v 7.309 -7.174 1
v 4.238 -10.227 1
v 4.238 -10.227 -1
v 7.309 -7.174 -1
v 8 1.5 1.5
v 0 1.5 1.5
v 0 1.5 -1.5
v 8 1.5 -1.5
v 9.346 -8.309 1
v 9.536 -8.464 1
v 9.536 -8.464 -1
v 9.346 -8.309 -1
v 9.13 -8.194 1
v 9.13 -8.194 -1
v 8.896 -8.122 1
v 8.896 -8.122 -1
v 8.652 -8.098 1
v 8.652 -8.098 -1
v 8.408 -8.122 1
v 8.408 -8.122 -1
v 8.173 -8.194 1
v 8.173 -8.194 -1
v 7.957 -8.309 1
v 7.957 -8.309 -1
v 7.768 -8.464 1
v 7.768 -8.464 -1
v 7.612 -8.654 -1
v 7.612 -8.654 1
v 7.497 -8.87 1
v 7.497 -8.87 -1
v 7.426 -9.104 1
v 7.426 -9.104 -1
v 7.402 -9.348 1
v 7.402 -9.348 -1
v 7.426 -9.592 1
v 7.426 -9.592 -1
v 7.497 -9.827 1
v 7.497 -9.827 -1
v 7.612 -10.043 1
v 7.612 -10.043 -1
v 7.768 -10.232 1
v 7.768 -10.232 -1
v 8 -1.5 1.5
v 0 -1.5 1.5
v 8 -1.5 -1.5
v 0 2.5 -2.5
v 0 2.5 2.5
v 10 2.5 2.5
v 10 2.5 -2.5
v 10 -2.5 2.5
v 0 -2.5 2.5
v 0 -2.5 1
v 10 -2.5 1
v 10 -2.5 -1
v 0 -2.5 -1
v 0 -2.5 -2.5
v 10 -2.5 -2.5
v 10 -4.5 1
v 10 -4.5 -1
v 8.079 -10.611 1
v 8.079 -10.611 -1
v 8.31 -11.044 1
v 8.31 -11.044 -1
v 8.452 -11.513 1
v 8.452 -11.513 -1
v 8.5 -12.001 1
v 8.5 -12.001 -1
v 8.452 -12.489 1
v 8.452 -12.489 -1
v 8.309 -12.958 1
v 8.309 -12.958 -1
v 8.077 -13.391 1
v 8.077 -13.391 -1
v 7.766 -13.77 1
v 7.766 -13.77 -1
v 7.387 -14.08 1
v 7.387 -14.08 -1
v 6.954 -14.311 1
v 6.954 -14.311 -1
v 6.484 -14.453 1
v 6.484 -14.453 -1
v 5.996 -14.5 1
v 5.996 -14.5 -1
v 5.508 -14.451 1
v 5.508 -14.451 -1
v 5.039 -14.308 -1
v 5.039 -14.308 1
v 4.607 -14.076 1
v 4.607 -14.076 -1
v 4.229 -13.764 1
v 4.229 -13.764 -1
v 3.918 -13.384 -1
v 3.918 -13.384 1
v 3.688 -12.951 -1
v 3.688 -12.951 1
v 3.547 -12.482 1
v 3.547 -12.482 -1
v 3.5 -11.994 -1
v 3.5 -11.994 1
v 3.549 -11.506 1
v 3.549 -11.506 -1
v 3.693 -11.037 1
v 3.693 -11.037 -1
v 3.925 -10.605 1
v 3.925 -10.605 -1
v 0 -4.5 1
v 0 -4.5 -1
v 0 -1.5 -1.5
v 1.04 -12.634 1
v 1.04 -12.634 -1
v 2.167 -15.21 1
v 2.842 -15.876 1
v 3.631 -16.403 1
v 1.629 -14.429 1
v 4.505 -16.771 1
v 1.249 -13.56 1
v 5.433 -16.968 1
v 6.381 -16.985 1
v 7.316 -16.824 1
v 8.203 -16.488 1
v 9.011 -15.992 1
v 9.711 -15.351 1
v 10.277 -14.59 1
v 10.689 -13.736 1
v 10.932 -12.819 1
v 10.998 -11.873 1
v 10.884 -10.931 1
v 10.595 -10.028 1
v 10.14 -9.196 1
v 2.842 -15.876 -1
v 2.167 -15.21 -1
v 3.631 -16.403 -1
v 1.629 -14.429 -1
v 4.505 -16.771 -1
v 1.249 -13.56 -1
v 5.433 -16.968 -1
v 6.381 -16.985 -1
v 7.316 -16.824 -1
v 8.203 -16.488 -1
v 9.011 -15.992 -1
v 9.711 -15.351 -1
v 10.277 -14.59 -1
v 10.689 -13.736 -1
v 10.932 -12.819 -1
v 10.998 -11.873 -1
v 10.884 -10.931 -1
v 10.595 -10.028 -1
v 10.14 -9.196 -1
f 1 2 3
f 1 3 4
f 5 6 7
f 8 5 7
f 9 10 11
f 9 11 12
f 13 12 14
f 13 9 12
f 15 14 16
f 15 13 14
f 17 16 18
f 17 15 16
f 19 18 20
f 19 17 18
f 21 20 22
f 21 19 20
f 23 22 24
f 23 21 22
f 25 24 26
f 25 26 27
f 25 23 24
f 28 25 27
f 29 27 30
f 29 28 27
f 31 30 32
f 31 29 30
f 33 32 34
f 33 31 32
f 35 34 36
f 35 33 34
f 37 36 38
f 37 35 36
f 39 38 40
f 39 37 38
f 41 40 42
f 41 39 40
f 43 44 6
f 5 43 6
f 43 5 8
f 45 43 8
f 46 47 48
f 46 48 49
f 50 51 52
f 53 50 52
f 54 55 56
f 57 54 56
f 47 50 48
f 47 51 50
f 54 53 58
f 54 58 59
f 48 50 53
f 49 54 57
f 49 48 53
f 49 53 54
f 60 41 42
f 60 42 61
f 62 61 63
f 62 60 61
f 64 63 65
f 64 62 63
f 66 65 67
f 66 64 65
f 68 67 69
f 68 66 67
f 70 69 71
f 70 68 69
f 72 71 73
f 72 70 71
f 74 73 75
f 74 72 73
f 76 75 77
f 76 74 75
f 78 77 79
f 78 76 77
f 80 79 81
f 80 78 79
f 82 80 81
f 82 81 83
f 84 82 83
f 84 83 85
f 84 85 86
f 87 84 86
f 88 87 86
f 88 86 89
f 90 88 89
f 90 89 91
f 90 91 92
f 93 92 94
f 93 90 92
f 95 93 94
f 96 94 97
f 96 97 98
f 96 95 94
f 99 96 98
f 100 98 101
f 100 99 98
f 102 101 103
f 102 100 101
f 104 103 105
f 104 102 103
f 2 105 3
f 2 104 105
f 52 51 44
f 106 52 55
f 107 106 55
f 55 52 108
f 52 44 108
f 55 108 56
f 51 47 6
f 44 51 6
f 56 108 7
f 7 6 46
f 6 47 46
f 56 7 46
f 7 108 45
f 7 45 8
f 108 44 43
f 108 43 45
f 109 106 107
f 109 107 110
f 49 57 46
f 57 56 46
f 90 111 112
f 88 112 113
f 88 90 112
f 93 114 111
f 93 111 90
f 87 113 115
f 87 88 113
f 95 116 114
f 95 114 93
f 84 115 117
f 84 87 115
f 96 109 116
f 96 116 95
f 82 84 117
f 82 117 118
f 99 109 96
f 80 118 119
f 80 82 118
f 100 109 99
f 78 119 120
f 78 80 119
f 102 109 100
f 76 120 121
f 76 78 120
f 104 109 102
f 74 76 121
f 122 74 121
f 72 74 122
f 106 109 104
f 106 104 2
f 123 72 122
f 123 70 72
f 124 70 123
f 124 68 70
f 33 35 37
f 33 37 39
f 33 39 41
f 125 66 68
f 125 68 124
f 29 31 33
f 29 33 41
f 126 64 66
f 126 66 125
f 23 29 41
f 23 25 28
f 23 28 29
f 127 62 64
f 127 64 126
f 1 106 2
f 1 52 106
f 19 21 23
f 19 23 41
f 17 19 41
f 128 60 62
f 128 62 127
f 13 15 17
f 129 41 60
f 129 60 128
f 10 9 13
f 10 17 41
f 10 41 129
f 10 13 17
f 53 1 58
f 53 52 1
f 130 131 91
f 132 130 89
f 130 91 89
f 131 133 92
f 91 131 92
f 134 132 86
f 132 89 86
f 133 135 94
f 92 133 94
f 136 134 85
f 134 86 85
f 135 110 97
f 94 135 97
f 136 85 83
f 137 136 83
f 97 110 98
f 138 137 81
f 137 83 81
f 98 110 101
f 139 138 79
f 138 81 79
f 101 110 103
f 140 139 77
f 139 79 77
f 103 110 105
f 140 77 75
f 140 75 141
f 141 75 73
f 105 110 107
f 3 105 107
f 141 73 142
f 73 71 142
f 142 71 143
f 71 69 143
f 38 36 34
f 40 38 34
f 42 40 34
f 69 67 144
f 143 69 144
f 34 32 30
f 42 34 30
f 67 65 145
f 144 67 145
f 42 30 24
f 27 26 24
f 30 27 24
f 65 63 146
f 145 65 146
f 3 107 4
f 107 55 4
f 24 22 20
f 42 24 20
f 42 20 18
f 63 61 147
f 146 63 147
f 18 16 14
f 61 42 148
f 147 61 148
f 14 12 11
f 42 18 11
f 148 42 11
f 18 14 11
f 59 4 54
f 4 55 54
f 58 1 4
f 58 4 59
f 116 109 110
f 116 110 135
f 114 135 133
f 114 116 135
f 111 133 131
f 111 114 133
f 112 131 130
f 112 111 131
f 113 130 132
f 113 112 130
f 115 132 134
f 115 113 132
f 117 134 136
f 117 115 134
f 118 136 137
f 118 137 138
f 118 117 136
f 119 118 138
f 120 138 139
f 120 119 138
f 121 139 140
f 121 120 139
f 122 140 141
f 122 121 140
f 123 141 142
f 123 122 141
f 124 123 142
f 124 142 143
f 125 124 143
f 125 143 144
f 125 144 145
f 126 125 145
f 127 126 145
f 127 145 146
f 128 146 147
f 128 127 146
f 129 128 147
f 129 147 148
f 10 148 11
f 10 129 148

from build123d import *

# Parameters (mm, degrees)
SKETCH_1_W      = 5
SKETCH_1_H      = 5
SKETCH_1_W_2    = 3
SKETCH_1_H_2    = 3
EXTRUDE_1_DEPTH = 8
SKETCH_2_W      = 5
SKETCH_2_H      = 5
EXTRUDE_2_DEPTH = 2
SKETCH_3_W      = 10
SKETCH_3_H      = 2
EXTRUDE_3_DEPTH = 2
EXTRUDE_4_DEPTH = 2


with BuildPart() as part:
    # 草图1 → 凸台-拉伸1 (new body)
    with BuildSketch(Plane(origin=(0, 0, 0), x_dir=(0, 0, -1), z_dir=(1, 0, 0))):
        Rectangle(SKETCH_1_W, SKETCH_1_H)
        Rectangle(SKETCH_1_W_2, SKETCH_1_H_2, mode=Mode.SUBTRACT)
    extrude(amount=EXTRUDE_1_DEPTH)

    # 草图2 → 凸台-拉伸2 (add)
    with BuildSketch(Plane(origin=(8, 0, 0), x_dir=(0, 0, -1), z_dir=(1, 0, 0))):
        Rectangle(SKETCH_2_W, SKETCH_2_H)
    extrude(amount=EXTRUDE_2_DEPTH)

    # 草图3 → 凸台-拉伸3 (add)
    with BuildSketch(Plane.XZ.offset(2.5)):
        with Locations((5, 0)):
            Rectangle(SKETCH_3_W, SKETCH_3_H)
    extrude(amount=EXTRUDE_3_DEPTH)

    # 草图4 → 凸台-拉伸4 (add)
    with BuildSketch(Plane.XY.offset(1)):
        with BuildLine():
            Line((10, -4.5), (0, -4.5))
            Line((0, -4.5), (1.040402547, -12.634344629))
            ThreePointArc((1.040402547, -12.634344629), (8.203170669, -16.488433915), (9.535533906, -8.464466094))
            ThreePointArc((9.535533906, -8.464466094), (7.767766953, -8.464466094), (7.767766953, -10.232233047))
            ThreePointArc((7.767766953, -10.232233047), (5.996135796, -14.499997014), (4.237706296, -10.226776691))
            Line((4.237706296, -10.226776691), (7.30901916, -7.174394459))
            Line((7.30901916, -7.174394459), (10, -4.5))
        make_face()
    extrude(amount=-EXTRUDE_4_DEPTH)


solid = part.part
